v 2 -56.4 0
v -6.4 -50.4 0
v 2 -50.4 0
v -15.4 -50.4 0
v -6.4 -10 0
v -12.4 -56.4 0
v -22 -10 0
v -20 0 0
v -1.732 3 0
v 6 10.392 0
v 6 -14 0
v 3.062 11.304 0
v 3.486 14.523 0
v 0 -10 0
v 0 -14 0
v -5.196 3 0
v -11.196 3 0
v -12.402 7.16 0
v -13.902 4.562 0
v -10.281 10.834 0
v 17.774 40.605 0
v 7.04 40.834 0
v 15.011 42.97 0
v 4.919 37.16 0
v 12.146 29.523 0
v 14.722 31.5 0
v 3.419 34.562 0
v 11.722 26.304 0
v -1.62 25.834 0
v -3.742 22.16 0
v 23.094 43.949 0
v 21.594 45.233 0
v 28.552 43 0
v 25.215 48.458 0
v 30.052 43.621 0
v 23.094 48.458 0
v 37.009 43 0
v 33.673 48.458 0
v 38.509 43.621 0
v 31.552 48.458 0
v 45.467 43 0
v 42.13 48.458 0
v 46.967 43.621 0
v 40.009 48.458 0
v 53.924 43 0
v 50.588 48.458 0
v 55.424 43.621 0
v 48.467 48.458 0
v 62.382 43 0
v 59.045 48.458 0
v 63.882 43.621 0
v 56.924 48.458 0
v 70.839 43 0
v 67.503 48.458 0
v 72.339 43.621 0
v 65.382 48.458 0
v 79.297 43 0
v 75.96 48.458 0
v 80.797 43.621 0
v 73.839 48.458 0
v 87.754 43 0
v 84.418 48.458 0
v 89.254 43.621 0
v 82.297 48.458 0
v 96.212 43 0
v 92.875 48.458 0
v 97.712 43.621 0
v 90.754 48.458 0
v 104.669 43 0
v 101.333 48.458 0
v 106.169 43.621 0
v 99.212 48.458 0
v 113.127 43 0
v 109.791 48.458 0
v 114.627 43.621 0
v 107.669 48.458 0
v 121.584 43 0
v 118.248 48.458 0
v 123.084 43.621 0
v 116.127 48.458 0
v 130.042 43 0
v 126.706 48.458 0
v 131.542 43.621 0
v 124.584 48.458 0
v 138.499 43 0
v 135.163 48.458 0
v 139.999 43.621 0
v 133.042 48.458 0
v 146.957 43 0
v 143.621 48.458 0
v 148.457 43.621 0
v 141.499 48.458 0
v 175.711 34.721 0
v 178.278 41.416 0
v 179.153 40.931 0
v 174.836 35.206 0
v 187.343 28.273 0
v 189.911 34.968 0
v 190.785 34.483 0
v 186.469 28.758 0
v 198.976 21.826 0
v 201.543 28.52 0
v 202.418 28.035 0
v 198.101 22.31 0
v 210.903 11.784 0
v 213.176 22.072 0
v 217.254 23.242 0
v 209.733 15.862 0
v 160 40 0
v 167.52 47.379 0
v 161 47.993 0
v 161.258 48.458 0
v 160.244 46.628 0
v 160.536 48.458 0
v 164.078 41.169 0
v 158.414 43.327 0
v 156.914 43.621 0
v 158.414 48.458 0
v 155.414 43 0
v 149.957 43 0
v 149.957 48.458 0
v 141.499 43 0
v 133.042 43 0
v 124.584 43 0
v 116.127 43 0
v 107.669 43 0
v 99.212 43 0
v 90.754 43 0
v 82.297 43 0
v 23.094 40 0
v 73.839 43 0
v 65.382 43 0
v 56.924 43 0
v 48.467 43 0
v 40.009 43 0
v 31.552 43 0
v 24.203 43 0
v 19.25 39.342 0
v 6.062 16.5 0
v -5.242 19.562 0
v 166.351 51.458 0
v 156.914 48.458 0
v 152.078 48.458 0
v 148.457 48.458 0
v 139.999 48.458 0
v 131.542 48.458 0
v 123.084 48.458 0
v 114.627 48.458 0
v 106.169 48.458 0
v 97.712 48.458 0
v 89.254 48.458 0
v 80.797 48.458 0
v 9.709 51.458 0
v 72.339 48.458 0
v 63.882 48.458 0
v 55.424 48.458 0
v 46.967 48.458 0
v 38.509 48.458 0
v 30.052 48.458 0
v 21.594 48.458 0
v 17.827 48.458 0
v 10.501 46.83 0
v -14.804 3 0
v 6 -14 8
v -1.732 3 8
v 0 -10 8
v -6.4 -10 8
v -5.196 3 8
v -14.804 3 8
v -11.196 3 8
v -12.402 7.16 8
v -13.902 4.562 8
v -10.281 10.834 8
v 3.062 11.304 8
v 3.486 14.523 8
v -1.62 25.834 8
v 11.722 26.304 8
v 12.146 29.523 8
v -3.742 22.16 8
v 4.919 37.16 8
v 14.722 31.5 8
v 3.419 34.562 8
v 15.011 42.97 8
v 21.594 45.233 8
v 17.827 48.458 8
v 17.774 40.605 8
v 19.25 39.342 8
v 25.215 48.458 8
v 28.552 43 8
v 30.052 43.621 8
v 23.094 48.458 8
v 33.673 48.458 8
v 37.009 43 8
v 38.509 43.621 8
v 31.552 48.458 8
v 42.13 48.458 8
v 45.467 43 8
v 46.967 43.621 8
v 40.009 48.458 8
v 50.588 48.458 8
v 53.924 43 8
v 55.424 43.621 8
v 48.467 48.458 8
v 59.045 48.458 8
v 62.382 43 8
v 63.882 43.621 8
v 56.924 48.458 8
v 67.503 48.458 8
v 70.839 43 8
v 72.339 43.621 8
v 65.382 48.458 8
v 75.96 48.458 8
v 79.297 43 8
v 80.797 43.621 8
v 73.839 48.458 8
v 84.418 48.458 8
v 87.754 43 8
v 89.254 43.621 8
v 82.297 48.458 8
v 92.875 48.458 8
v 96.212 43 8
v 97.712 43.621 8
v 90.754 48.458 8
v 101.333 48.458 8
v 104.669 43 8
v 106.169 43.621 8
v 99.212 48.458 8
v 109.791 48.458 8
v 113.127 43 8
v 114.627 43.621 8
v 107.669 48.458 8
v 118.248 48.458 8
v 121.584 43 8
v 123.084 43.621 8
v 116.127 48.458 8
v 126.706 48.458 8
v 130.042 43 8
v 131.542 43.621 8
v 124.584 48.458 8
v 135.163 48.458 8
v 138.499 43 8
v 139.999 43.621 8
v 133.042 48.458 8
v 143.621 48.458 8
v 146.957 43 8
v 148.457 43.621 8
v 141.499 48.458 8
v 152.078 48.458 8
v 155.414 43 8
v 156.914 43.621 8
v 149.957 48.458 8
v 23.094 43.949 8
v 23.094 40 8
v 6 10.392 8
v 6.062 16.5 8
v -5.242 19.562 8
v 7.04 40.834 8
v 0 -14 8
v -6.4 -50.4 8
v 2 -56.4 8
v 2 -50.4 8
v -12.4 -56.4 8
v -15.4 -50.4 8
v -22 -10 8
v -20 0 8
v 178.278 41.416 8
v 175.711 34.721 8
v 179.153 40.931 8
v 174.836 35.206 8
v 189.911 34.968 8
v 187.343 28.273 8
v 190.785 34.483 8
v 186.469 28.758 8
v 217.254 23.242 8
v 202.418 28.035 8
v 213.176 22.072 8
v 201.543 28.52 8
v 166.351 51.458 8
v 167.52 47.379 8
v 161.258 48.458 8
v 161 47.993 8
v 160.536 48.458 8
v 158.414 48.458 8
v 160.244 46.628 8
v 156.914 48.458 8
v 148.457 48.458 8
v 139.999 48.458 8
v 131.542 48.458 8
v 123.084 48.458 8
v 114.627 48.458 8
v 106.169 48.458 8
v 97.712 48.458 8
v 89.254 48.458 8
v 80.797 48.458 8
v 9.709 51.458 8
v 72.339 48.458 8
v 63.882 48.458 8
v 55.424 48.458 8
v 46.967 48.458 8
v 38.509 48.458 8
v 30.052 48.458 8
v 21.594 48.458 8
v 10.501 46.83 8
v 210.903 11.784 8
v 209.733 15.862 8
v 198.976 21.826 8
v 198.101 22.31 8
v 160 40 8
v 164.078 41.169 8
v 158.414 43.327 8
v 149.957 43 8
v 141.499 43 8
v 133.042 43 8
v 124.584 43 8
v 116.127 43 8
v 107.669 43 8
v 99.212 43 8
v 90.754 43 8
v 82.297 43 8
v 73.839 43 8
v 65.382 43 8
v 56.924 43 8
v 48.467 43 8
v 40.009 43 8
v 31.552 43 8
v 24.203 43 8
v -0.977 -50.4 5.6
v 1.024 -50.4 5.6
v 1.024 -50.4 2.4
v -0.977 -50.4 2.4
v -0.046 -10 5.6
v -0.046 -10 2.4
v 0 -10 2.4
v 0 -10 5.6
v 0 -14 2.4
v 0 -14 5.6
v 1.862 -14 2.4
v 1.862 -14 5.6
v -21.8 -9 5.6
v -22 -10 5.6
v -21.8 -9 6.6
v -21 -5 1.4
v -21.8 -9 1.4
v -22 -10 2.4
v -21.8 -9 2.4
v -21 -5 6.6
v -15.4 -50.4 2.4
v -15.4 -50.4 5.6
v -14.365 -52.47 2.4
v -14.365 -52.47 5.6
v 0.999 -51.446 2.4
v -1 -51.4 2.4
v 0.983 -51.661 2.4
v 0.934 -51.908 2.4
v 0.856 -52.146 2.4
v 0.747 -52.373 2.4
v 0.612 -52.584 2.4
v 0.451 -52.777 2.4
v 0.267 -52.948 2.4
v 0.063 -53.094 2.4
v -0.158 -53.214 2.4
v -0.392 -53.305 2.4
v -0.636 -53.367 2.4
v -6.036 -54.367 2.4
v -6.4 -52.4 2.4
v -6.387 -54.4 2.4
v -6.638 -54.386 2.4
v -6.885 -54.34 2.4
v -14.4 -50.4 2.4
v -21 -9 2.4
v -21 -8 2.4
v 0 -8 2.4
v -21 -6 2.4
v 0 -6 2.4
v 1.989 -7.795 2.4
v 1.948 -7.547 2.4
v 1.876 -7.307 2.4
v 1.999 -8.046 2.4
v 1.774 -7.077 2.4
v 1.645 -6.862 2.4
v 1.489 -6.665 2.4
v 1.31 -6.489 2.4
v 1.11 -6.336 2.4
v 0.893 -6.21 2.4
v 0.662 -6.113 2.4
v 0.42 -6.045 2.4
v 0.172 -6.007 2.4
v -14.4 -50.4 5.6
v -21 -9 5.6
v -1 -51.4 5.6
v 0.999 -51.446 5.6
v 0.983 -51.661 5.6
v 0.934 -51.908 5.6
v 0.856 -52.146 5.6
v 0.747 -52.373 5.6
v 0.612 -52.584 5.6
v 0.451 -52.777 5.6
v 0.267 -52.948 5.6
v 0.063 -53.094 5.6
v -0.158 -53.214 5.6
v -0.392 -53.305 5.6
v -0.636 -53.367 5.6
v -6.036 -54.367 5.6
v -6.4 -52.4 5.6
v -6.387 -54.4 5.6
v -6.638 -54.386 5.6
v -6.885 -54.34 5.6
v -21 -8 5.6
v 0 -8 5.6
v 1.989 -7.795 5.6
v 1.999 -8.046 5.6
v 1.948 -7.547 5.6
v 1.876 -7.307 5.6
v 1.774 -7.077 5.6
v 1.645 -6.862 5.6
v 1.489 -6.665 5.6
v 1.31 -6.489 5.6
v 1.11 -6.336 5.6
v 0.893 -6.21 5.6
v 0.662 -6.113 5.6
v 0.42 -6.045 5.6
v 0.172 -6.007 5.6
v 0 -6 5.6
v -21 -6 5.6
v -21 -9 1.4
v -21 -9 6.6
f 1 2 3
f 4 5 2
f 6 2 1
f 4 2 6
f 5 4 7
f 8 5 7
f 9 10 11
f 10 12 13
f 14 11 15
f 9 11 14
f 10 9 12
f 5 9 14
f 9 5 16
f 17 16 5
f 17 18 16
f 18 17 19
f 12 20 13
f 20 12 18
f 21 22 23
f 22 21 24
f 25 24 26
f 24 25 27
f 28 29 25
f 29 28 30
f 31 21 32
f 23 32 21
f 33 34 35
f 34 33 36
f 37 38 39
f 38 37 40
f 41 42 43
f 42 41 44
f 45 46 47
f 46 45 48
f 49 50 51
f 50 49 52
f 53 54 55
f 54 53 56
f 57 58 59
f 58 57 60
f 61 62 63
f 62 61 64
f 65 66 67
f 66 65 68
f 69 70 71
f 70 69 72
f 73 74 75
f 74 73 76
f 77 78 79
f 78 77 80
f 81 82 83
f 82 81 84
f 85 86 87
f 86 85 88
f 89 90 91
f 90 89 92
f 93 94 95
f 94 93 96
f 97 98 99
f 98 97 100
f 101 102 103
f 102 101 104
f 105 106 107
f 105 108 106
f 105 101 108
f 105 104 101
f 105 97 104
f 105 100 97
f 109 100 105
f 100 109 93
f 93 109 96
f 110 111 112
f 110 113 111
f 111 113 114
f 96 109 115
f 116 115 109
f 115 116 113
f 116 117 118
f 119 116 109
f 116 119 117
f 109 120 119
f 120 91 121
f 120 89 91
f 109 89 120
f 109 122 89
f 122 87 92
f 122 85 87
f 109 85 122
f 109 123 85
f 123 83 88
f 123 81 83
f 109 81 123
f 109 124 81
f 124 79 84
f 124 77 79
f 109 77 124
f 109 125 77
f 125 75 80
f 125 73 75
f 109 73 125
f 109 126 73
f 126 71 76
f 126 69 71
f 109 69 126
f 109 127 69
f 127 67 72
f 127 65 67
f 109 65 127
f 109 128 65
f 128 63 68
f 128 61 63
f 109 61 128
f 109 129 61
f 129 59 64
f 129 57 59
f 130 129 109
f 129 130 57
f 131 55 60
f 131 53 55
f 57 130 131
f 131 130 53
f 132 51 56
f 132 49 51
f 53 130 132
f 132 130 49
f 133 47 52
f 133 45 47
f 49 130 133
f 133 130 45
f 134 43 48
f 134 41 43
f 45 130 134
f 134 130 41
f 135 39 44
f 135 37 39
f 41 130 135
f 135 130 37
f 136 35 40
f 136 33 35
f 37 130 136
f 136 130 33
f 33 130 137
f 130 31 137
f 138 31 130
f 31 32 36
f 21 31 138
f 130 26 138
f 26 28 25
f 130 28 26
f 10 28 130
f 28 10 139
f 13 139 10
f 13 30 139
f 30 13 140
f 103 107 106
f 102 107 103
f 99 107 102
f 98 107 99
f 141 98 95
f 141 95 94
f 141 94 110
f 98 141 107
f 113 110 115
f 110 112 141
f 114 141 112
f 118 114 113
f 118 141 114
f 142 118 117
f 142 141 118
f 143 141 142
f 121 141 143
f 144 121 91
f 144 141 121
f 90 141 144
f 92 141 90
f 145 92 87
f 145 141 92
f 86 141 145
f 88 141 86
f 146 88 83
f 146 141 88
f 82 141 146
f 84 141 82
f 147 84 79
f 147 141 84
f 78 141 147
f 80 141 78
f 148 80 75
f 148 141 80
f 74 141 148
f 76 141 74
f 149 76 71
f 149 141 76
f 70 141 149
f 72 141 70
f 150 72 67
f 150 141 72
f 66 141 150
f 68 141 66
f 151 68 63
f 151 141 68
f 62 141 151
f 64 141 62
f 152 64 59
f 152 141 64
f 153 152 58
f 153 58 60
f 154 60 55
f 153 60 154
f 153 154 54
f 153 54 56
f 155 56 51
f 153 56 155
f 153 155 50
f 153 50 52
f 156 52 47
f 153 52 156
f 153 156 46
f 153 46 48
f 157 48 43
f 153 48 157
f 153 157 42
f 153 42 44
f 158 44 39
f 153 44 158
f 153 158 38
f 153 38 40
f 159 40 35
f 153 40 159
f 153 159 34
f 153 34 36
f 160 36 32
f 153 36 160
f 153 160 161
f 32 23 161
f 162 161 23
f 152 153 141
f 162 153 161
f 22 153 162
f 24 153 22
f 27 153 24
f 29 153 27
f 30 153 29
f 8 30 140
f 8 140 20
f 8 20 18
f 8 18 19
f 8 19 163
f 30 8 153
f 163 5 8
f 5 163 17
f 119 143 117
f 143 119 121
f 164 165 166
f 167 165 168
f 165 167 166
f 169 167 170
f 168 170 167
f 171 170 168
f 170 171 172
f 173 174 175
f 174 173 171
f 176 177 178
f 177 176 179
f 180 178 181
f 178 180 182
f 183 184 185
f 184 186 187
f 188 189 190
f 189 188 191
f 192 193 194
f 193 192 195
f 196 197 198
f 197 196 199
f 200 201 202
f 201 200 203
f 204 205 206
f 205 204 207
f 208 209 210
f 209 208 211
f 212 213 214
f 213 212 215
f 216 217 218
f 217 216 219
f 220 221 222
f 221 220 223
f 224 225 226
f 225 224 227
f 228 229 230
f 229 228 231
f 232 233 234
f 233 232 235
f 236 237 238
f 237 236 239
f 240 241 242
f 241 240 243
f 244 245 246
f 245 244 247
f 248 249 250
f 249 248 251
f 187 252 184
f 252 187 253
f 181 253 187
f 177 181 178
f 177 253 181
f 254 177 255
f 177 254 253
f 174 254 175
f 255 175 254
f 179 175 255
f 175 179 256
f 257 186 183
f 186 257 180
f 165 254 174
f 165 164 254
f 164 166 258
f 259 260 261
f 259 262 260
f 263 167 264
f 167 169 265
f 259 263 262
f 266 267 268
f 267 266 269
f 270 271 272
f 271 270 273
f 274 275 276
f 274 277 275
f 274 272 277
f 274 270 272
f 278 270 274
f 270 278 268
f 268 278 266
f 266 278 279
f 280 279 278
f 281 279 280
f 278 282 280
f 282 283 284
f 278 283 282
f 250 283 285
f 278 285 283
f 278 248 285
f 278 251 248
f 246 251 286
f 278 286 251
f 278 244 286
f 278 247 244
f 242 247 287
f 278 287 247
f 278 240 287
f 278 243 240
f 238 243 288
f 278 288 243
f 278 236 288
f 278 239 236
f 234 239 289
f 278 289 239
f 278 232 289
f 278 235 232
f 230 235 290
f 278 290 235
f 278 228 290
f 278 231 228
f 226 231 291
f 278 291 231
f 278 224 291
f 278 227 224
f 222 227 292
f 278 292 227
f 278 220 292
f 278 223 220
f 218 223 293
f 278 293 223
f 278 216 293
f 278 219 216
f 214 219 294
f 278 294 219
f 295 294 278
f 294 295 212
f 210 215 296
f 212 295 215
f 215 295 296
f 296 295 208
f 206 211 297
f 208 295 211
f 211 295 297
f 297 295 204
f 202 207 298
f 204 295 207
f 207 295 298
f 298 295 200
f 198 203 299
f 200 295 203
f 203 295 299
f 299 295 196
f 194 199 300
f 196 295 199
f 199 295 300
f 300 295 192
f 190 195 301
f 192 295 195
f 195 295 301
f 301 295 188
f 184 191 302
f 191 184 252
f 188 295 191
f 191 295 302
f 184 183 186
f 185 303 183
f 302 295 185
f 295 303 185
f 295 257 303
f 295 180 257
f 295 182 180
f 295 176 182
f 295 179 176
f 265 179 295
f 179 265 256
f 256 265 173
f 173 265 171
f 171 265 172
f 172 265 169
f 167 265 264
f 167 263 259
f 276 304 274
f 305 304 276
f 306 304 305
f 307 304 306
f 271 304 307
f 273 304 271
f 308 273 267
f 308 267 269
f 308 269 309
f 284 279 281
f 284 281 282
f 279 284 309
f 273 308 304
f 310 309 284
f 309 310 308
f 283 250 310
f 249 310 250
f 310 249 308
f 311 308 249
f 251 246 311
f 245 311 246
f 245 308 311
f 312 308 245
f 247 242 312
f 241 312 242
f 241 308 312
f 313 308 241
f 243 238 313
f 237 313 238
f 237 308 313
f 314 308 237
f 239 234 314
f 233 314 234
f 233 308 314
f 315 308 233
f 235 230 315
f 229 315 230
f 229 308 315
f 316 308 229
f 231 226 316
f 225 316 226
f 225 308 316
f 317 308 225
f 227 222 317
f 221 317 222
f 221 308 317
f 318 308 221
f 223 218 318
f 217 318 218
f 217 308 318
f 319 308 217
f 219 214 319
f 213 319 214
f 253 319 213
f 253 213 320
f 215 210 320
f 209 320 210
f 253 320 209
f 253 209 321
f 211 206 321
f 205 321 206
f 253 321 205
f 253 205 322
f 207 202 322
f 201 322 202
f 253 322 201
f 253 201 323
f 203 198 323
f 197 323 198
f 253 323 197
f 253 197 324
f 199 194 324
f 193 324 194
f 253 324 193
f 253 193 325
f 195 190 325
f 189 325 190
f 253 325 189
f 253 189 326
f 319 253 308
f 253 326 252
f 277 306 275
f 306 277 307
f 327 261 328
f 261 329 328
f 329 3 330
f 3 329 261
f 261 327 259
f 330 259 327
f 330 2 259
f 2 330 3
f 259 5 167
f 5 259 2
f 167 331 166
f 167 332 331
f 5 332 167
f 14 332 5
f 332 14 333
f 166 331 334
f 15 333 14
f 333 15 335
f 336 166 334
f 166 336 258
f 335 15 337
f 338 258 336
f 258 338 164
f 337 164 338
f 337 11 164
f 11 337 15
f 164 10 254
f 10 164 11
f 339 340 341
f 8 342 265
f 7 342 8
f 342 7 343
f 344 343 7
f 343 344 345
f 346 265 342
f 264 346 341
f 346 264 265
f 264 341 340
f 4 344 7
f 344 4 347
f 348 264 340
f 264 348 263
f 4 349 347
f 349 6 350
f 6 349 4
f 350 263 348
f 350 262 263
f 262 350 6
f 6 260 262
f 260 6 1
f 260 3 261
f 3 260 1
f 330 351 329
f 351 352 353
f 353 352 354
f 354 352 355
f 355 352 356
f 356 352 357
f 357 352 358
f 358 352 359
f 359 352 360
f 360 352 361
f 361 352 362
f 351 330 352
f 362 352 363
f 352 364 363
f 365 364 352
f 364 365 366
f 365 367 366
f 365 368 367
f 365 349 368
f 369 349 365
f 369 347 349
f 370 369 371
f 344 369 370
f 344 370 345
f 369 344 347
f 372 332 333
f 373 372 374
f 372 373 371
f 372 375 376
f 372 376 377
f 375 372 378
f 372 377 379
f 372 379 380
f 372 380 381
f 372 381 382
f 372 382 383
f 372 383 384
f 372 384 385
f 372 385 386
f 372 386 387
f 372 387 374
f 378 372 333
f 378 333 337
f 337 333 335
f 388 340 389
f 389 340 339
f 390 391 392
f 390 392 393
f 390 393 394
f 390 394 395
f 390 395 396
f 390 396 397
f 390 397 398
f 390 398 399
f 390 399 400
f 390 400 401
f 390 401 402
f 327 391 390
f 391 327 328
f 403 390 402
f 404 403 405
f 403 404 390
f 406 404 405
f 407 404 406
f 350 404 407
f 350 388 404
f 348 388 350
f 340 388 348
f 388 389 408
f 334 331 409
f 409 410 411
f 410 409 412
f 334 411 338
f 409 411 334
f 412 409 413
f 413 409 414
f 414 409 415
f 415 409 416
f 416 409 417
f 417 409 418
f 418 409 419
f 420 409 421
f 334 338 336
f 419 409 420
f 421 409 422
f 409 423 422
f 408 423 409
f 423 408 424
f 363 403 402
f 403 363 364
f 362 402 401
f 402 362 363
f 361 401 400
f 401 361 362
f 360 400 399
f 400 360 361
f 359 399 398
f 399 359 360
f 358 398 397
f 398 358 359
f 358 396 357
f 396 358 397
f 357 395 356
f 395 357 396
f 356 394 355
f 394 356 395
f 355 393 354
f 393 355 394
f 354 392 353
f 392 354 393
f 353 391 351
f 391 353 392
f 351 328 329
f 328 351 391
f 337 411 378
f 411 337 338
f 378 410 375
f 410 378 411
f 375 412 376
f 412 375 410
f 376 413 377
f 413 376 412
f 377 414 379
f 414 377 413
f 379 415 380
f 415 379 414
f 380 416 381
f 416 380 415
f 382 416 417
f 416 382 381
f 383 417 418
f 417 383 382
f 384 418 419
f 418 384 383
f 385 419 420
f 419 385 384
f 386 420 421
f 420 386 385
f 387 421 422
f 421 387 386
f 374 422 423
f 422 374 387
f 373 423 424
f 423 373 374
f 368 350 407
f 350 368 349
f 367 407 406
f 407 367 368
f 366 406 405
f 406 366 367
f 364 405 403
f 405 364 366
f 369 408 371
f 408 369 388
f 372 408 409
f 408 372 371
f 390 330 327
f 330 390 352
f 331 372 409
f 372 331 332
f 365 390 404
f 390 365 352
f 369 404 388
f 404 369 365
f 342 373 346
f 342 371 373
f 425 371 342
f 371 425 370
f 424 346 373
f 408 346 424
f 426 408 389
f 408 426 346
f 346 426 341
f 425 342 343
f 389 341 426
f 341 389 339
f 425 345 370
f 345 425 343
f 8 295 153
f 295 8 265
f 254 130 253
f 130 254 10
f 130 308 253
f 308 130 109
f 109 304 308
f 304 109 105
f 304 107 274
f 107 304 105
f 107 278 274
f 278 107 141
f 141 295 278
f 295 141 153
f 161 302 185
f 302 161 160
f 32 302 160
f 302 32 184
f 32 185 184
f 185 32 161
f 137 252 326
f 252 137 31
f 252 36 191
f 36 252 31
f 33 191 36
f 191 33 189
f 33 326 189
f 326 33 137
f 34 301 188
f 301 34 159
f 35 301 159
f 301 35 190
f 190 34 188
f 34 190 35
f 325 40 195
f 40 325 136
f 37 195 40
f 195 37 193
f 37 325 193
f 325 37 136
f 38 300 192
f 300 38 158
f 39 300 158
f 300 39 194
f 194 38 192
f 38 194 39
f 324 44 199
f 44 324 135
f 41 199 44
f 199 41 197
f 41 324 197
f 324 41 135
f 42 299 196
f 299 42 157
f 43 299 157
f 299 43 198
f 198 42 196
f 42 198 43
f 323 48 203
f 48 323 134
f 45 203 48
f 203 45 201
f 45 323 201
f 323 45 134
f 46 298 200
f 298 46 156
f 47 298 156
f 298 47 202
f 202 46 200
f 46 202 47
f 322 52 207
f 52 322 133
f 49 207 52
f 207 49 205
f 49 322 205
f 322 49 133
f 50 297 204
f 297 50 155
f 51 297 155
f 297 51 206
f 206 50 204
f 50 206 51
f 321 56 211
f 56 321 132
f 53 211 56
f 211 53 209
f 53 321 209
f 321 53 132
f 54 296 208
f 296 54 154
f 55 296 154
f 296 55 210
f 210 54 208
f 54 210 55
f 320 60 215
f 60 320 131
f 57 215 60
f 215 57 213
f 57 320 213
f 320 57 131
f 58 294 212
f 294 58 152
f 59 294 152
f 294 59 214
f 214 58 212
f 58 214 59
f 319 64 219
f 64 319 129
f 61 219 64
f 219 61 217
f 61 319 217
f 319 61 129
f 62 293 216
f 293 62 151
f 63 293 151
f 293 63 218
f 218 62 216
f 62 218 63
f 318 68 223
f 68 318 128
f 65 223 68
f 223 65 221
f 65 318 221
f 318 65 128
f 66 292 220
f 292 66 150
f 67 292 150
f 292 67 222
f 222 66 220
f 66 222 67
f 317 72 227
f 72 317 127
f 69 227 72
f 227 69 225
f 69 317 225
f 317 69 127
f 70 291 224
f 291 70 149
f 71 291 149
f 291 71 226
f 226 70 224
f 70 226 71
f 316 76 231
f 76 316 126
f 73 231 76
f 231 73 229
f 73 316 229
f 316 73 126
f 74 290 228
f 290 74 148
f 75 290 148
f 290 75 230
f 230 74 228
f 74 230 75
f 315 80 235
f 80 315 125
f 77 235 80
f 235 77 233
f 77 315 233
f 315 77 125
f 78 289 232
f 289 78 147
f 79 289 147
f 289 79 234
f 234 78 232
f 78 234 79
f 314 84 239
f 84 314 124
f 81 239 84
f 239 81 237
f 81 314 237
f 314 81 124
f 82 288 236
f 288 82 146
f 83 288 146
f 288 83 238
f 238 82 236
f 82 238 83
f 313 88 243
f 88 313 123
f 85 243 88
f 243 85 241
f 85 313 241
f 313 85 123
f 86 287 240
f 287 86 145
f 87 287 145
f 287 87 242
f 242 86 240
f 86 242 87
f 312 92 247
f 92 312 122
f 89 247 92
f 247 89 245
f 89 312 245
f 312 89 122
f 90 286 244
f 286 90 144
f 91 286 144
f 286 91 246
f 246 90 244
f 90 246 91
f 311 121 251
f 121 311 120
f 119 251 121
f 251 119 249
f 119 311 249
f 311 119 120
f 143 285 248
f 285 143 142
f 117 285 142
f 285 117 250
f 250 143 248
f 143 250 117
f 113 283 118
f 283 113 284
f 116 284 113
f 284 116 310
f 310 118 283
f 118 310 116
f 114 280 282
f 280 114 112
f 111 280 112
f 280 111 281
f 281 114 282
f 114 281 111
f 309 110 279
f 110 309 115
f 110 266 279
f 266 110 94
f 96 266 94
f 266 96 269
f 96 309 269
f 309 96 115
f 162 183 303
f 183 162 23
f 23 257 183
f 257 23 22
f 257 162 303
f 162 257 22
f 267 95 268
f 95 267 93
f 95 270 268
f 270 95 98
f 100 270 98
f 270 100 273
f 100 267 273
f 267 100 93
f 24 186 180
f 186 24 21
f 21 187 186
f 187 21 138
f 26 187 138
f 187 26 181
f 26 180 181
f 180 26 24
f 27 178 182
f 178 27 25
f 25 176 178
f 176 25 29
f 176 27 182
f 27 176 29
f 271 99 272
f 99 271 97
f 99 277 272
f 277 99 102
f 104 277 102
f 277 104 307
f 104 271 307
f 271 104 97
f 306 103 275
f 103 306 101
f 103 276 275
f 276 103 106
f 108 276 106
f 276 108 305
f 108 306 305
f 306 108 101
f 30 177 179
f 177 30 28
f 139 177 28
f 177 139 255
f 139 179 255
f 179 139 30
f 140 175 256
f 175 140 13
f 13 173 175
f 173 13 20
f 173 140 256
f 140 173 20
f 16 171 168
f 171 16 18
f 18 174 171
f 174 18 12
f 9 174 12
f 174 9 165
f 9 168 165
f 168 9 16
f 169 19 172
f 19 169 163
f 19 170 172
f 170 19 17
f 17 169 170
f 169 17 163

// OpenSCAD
/*
 * LED profile holder for Prusa i3 MK2S with an attachment designed like the Prusa i3 MK2S spool holder
 * 
 * Copyright (C) 2017  Matthias Gazzari
 * 
 * This program is free software: you can redistribute it and/or modify
 * it under the terms of the GNU General Public License as published by
 * the Free Software Foundation, either version 3 of the License, or
 * (at your option) any later version.
 * 
 * This program is distributed in the hope that it will be useful,
 * but WITHOUT ANY WARRANTY; without even the implied warranty of
 * MERCHANTABILITY or FITNESS FOR A PARTICULAR PURPOSE.  See the
 * GNU General Public License for more details.
 * 
 * You should have received a copy of the GNU General Public License
 * along with this program.  If not, see <https://www.gnu.org/licenses/>.
*/

// general holder dimension in mm
thickness = 8;
base_w = 20;
overlap_w = 6;

// Prusa i3 MK2S frame dimensions in mm
frame_tolerance = 0.4;
frame_w = 6 + frame_tolerance;
frame_h = 40 + frame_tolerance;

// cable tie dimensions in mm
tie_tolerance_w = 0.7;
tie_tolerance_h = 1;
tie_w = 2.5 + tie_tolerance_w;
tie_h = 1 + tie_tolerance_h;

// base part of the holder
$fn=50;
base(frame_w, frame_h, thickness, base_w, overlap_w, tie_w, tie_h);

// arm dimensions in mm
arm_w = 160;
arm_h = 40;
arm_angle = 60;
arm_border = 3;

// aluminium profile dimensions in mm
profile_tolerance = 0.1;
profile_w = 12.2 + profile_tolerance;
profile_h = 7 + profile_tolerance;
profile_num = 4;
profile_spacing = 1;
profile_angle = -29;

// arm part of the holder
arm(
	arm_w, arm_h, arm_angle, arm_border,
	thickness, base_w, overlap_w,
	profile_w, profile_h, profile_num, profile_spacing, profile_angle
);

function cot(x) = tan(90 - x);

module triangle_strut(size, width) {
	points=[[0, 0], [size, 0], [0, size]];
	difference() {
		offset(delta = width) polygon(points);
		polygon(points);
	}
}

module profile_holder(num, w, h, spacing, border) {
	difference() {
		square([num * w + (num - 1) * spacing + 2 * border, h + 2 * border]);
		for (i = [0:num - 1]) {
			x = border + i * (w + spacing);
			translate([x, border]) square([w, h]);
		}
	}
}

module base(frame_w, frame_h, thickness, base_w, overlap_w, tie_w, tie_h,
			size=6, height=10, bottom_overlap_w=2, bracket_len=4)
{
	// outer shape of the base
	outer_points = [
		[0, 0],
		[0 , -bracket_len],
		[overlap_w, -bracket_len],
		[overlap_w, height],
		[0, height],
		[-base_w, height],
		[-1.1 * base_w, 0],
		[-frame_w - 1.5 * size, -frame_h],
		[-frame_w - size, -(frame_h + size)],
		[bottom_overlap_w, -(frame_h + size)],
		[bottom_overlap_w, -frame_h],
		[-frame_w, -frame_h],
		[-frame_w, 0],
	];
	// shape of the cable tie hole
	inner_points = [
		[0, 2],
		[-1.1 * base_w + 1, 2],
		[-frame_w - 1.5 * size + 1, -frame_h],
		[-frame_w, -frame_h - 2],
		[-1, -frame_h - 1],
	];
	translate([0, -height, 0]) difference() {
		linear_extrude(thickness) polygon(points=outer_points);
		translate ([0, 0, (thickness - tie_w) / 2]) linear_extrude(tie_w) difference() {
			offset(r = tie_h) polygon(points = inner_points);
			polygon(points = inner_points);
		}
		translate ([-1.1 * base_w, 1, (8 - tie_w - 2) / 2])
			cube(size = [1, tie_h + 2, tie_w + 2]);
	}
}

module arm(arm_width, arm_height, arm_angle, arm_border, thickness, base_w, overlap_w,
		profile_w, profile_h, profile_num, profile_spacing, profile_angle)
{
	// polygon definition
	holder_height = (profile_h + 2 * arm_border);
	arm_thickness = cos(profile_angle) * holder_height;
	arm_offset = abs(sin(profile_angle) * holder_height);
	attachment_offset = cot(arm_angle) * arm_height + cot(arm_angle) * arm_thickness;
	arm_points = [
		[-base_w, 0],
		[0, 0],
		[overlap_w, 0],
		[overlap_w, tan(arm_angle) * overlap_w],
		[cot(arm_angle) * arm_height, arm_height],
		[arm_width, arm_height],
		[arm_width + arm_offset, arm_height + arm_thickness],
		[-base_w + attachment_offset, arm_height + arm_thickness],
	];
	attachment_part = [[0, 1, 4, 7]];
	middle_part = [[4, 7, 6, 5]];
	
	linear_extrude(thickness) {
		// hollow arm
		difference() {
			polygon(points = arm_points);
			offset(r = -arm_border) polygon(points = arm_points, paths = attachment_part);
			offset(r = -arm_border) polygon(points = arm_points, paths = middle_part);
		}
		// attachment part
		intersection() {
			polygon(points = arm_points, paths = attachment_part);
			size = sin(arm_angle) * base_w - 2 * arm_border;
			width = arm_border;
			steps = size + 2 * width;
			for (i = [0:steps:arm_height + arm_border]) {
				rotate(arm_angle) translate([i, arm_border]) triangle_strut(size, width);
			}
		}
		// middle part
		intersection() {
			polygon(points = arm_points, paths = middle_part);
			size = arm_thickness - 2 * arm_border;
			width = arm_border / 2;
			steps = size + 2 * width;
			for (i = [cot(arm_angle) * arm_height:steps:arm_width]) {
				translate([i, arm_height + arm_border]) triangle_strut(size, width);
			}
		}
		// profile holder part
		translate([arm_width, arm_height]) rotate(profile_angle)
			profile_holder(profile_num, profile_w, profile_h, profile_spacing, arm_border);
	}
}
